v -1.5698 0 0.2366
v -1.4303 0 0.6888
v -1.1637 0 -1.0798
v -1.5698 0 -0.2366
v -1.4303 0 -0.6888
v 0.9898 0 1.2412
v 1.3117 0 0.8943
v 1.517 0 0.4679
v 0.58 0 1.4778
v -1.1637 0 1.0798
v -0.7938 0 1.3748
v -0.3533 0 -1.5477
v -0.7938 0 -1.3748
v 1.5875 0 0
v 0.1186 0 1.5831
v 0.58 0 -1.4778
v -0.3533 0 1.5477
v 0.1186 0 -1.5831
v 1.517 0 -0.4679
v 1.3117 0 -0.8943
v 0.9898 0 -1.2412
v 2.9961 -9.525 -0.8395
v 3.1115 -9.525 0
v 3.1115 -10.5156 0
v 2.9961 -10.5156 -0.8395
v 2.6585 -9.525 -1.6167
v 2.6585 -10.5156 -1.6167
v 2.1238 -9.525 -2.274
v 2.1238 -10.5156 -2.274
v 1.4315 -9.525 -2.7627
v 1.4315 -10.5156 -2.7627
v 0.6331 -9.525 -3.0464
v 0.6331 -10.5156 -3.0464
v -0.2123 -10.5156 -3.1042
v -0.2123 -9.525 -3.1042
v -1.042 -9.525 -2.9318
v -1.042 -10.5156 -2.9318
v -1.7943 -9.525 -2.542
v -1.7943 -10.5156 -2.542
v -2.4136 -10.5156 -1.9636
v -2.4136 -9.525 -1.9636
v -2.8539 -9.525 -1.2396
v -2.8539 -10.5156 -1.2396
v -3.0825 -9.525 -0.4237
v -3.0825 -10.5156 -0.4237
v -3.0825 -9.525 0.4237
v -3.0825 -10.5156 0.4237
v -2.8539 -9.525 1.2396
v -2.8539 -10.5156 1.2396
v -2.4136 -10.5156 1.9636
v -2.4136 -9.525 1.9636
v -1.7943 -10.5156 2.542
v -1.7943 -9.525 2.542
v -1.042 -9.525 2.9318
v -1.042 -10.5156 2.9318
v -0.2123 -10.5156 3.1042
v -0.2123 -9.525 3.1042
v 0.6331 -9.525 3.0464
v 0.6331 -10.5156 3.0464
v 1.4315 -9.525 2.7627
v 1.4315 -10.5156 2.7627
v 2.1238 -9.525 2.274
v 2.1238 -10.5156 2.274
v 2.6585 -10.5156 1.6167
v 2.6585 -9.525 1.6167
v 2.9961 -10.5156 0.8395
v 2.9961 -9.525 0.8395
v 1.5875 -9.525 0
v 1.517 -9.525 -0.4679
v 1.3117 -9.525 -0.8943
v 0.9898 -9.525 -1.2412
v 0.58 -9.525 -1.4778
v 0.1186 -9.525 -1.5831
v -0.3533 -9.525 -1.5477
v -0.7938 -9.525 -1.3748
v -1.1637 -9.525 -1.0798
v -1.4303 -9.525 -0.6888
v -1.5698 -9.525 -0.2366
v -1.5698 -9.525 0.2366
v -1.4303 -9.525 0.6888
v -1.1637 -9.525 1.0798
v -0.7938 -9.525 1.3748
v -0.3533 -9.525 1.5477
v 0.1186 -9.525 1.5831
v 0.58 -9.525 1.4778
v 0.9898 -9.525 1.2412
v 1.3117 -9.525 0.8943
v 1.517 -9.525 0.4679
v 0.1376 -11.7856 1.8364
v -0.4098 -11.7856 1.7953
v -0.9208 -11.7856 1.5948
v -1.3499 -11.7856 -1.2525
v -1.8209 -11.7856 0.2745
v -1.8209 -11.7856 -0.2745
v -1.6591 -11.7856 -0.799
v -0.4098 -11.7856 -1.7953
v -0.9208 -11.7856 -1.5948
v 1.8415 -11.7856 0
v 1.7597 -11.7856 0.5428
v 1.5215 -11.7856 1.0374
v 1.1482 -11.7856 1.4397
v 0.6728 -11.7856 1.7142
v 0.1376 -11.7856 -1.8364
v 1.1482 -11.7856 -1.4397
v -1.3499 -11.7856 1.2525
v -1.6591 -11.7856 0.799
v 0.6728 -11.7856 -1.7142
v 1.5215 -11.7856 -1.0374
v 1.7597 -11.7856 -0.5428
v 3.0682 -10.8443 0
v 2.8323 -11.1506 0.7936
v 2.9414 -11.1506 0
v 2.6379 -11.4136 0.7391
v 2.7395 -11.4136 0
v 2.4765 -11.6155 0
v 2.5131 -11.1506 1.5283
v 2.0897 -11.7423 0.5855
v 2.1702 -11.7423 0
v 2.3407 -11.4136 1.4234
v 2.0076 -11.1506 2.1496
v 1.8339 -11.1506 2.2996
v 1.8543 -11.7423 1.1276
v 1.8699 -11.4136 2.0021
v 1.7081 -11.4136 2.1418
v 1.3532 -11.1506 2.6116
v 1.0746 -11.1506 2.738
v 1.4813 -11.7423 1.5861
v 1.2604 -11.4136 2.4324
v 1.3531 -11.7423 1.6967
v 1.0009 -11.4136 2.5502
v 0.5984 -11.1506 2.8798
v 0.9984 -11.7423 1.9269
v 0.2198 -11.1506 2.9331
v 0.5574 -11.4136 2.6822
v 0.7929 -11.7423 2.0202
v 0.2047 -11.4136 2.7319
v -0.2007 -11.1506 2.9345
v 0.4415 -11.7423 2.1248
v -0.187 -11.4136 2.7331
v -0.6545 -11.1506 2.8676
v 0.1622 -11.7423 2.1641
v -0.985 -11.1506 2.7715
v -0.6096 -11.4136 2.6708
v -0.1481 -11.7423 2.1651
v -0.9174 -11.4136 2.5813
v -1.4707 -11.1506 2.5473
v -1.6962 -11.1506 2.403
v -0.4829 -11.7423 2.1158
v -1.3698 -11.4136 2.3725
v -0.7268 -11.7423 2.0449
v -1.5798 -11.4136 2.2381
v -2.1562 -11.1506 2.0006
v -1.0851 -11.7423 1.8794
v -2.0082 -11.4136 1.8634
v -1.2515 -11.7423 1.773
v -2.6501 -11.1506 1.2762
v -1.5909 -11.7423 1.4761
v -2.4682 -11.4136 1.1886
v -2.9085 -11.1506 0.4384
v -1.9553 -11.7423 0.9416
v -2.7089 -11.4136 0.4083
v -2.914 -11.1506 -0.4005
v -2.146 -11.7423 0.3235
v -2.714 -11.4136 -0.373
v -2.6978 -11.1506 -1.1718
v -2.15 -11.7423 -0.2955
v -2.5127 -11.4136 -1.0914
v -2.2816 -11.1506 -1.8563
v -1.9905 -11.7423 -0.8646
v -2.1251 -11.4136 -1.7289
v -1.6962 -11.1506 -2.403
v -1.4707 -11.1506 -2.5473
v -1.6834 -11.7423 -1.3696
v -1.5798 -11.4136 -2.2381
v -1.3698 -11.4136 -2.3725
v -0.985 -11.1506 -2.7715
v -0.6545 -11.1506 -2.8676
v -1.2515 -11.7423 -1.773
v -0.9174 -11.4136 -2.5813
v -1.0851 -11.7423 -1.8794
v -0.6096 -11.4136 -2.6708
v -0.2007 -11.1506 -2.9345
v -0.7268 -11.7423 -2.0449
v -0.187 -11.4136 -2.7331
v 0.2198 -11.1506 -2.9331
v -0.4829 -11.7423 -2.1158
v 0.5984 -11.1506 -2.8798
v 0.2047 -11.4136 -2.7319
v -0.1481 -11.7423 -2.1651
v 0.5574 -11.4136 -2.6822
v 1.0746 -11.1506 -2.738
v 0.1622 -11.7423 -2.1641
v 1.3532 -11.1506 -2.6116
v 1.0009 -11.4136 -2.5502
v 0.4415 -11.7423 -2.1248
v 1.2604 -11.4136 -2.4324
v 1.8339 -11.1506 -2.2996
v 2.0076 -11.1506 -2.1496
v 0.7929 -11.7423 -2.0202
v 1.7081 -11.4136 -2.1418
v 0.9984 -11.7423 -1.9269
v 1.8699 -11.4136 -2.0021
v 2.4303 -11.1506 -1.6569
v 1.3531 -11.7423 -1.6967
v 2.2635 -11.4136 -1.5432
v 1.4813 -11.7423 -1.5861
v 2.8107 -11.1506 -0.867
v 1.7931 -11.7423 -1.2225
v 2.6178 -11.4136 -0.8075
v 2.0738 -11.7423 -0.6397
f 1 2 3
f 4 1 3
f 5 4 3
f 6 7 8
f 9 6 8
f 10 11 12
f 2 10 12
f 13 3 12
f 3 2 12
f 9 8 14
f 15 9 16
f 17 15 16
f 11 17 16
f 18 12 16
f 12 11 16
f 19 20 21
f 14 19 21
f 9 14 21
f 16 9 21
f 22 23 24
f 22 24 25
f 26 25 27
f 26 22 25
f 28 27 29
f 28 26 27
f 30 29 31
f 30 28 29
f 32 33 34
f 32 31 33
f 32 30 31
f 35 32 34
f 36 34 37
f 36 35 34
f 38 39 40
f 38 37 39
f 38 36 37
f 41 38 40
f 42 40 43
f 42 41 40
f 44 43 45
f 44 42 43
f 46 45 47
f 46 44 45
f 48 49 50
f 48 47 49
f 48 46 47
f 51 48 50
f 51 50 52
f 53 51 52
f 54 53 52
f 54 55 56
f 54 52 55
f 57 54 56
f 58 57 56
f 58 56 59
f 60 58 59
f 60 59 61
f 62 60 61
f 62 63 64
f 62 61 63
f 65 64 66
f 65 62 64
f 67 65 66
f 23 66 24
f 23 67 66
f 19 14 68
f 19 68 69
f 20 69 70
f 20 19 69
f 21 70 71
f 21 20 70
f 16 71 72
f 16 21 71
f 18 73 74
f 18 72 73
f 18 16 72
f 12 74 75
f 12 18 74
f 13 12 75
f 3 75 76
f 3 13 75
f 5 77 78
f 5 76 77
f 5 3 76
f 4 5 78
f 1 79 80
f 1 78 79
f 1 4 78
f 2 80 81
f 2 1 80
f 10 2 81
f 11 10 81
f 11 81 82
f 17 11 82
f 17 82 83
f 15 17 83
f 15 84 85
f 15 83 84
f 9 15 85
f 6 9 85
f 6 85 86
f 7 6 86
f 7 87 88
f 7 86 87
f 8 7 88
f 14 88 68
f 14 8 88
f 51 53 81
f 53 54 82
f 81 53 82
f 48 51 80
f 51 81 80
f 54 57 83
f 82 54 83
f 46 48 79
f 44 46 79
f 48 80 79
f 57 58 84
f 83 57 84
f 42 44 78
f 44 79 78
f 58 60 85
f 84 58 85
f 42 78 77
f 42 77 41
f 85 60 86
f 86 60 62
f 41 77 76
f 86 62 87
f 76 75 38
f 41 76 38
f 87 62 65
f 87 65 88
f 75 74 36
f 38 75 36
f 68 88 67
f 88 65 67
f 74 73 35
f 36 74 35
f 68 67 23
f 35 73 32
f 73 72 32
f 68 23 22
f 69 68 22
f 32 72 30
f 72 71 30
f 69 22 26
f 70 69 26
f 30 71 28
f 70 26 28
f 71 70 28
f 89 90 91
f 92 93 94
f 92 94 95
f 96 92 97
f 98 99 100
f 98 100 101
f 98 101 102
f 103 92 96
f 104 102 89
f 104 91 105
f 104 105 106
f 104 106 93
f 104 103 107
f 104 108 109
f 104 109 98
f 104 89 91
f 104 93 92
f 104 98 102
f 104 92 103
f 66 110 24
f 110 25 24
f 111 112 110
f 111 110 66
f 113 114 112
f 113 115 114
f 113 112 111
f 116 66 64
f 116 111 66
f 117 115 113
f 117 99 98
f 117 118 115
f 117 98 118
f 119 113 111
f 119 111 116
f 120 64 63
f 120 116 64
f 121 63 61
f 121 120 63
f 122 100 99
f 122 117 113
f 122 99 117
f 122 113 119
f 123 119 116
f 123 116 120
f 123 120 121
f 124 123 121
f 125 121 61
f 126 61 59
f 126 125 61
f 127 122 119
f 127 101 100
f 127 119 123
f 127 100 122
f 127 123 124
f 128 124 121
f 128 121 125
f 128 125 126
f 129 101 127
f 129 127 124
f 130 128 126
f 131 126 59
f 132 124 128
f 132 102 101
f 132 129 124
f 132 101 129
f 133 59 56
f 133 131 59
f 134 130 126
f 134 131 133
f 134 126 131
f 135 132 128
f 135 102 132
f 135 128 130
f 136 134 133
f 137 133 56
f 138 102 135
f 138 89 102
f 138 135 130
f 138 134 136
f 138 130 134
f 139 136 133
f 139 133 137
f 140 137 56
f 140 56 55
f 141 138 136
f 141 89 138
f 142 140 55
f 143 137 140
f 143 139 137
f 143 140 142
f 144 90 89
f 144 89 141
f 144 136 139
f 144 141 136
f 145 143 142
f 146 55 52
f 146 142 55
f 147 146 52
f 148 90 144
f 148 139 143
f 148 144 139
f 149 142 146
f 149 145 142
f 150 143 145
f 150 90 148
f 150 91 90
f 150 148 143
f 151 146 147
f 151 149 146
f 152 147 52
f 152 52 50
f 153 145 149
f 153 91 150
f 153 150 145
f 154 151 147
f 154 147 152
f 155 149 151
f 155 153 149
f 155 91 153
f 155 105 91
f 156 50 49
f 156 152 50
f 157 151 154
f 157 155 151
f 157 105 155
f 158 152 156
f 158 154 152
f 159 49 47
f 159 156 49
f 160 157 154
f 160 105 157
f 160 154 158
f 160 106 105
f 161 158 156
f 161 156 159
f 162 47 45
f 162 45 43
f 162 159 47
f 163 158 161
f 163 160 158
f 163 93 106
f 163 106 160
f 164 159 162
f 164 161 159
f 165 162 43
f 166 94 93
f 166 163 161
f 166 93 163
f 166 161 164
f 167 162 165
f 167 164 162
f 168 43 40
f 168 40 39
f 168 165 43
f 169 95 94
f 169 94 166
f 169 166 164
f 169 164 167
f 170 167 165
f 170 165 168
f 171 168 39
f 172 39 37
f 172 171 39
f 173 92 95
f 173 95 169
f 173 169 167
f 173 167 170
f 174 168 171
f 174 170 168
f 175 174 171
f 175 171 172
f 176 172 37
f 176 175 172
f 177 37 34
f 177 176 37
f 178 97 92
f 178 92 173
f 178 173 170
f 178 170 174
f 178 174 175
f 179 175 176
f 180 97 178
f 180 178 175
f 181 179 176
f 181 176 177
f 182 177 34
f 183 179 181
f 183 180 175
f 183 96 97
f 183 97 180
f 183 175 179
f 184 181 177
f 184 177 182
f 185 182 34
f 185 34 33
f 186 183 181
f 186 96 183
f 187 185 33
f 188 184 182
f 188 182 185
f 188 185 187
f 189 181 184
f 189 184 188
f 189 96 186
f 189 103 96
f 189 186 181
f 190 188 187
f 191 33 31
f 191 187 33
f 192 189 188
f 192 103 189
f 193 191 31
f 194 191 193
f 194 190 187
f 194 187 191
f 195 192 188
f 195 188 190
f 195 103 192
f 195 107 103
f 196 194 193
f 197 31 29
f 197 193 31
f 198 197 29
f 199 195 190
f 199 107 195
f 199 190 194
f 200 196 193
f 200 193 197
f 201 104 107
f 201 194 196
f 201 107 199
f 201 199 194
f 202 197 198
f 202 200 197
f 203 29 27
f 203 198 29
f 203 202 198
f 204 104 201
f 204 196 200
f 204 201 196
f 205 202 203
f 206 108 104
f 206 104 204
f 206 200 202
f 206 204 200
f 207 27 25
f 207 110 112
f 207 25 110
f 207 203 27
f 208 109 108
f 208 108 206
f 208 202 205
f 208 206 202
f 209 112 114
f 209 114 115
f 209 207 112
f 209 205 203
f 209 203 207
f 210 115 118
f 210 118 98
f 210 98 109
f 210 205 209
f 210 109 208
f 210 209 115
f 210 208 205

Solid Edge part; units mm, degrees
sketch "Sketch1" plane through (0, 0, 0) normal (0, -1, 0) x (1, 0, 0)
  circle A0 centre (0, 0) radius 1.5875
  dimension "D1" = 3.175
extrude "Protrusion1" add sketch "Sketch1" along normal blind 9.525
sketch "Sketch2" plane through (0, -9.525, 0) normal (0, -1, 0) x (1, 0, 0)
  circle A0 centre (0, 0) radius 3.1115
extrude "ExtrudedProtrusion_2" add sketch "Sketch2" along normal blind 2.2606
fillet "Round_1" radius 1.27 1 edges at (-3.1115, -11.7856, 0)
cosmetic_thread "Thread1" size "#5-40 UNC"
properties part number "91772A133"
